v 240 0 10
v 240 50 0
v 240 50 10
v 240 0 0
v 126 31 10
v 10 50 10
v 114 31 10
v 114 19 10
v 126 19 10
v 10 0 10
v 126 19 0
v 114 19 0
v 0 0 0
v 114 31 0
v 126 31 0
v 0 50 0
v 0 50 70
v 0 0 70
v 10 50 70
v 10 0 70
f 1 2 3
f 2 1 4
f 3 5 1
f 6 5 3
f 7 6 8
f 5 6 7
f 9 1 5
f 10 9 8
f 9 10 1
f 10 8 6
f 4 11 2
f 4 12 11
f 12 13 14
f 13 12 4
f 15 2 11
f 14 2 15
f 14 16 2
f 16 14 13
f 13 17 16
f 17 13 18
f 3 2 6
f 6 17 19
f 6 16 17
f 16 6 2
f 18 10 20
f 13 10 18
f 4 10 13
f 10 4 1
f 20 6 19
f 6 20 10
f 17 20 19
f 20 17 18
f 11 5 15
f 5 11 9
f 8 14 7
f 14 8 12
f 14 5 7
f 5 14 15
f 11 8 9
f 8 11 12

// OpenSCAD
$fn = 32;

// ----------------------------------------------------------------------
// Gantry bracket: 200-250 mm L bracket
// ----------------------------------------------------------------------

// --- parameters (mm) ---
base_l = 240;             // base arm length, X
arm_w = 50;               // arm width, Y
thick = 10;               // arm thickness
up_h = 60;                // vertical arm height, Z
slot_w = 12;              // adjustment slot width in the base
fit_tol = 0.1;            // tolerance for press fits, mm
free_tol = 0.3;           // tolerance for clearance fits, mm

total_h = up_h + thick;  // overall height

difference() {
  union() {
    cube([base_l, arm_w, thick]);
    cube([thick, arm_w, total_h]);
  }
  translate([base_l / 2 - slot_w / 2, arm_w / 2 - slot_w / 2, -1])
    cube([slot_w, slot_w, thick + 2]);
}
